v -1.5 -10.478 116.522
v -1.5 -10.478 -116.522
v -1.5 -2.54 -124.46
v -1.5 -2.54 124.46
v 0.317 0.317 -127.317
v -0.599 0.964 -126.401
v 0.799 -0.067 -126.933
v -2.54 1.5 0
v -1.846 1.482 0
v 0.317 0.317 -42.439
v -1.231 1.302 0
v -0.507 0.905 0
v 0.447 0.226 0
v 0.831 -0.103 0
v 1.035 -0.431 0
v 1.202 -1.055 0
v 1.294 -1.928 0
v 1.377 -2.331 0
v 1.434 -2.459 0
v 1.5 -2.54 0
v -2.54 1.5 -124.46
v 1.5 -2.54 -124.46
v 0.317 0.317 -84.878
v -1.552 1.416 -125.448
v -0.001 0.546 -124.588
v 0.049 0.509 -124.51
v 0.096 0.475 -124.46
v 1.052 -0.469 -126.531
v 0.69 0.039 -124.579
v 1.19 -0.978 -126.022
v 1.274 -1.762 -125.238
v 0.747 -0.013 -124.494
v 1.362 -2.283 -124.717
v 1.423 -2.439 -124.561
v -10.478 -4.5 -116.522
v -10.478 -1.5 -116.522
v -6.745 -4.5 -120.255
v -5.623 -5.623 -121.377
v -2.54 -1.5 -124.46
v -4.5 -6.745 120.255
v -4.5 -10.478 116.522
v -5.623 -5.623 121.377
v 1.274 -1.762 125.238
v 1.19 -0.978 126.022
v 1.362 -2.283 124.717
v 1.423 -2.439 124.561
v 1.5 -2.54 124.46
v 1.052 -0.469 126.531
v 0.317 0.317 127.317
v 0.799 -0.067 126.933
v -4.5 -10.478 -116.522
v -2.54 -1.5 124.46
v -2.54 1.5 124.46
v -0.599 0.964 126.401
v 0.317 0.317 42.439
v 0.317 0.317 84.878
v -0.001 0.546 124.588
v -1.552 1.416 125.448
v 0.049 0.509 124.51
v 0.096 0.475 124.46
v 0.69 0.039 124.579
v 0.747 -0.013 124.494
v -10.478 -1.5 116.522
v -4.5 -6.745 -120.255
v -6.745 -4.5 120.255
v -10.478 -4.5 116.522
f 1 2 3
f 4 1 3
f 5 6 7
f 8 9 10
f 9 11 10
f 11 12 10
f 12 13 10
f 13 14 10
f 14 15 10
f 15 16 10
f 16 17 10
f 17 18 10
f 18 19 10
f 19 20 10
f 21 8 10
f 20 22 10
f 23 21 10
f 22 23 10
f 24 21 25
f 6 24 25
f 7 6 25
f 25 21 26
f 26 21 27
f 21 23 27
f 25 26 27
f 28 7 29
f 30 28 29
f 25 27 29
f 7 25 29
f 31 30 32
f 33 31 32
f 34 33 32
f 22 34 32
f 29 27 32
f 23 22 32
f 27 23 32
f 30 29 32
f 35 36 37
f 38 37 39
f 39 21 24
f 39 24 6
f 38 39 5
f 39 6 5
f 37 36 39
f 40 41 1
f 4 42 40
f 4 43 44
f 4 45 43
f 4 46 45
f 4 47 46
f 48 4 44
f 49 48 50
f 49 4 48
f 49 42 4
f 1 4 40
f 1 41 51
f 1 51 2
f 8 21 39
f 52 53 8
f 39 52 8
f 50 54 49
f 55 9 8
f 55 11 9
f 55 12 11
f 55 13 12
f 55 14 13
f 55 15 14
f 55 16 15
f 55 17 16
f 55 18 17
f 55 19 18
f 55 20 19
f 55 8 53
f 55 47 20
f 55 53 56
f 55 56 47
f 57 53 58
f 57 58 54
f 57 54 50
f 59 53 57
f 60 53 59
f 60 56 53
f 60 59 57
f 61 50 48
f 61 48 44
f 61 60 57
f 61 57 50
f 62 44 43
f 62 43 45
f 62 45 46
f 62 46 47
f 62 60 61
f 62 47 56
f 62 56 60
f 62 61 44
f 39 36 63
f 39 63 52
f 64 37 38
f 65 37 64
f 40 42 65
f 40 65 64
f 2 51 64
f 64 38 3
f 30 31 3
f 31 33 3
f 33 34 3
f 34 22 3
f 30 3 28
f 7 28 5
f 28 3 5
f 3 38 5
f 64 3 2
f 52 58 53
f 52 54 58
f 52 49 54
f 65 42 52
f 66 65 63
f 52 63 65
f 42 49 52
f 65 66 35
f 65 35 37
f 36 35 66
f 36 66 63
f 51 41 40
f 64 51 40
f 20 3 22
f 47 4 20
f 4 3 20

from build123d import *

# Parameters (mm, degrees)
SKETCH7_W               = 7.9375
SKETCH7_H               = 3.000000096
BOSS_EXTRUDE2_DEPTH     = 130.175
SKETCH8_W               = 3.000000096
SKETCH8_H               = 7.9375
BOSS_EXTRUDE3_DEPTH     = 130.175
BOSS_EXTRUDE4_DEPTH     = 130.175
CUT_EXTRUDE4_DEPTH      = 132.01559704
CUT_EXTRUDE4_DEPTH_BACK = 132.01559704
CUT_EXTRUDE5_DEPTH      = 130.351482615
CUT_EXTRUDE5_DEPTH_BACK = 130.351482615


with BuildPart() as part:
    # Sketch7 → Boss-Extrude2 (new, symmetric)
    with BuildSketch(Plane.XY):
        with Locations((-6.50875, -3.000000096)):
            Rectangle(SKETCH7_W, SKETCH7_H)
    extrude(amount=BOSS_EXTRUDE2_DEPTH, both=True)

    # Sketch8 → Boss-Extrude3 (add, symmetric)
    with BuildSketch(Plane.XY):
        with Locations((-3.000000096, -6.50875)):
            Rectangle(SKETCH8_W, SKETCH8_H)
    extrude(amount=BOSS_EXTRUDE3_DEPTH, both=True)

    # Sketch11 → Boss-Extrude4 (add, symmetric)
    with BuildSketch(Plane.XY):
        with BuildLine():
            Line((-2.54, 1.500000048), (-2.54, -1.500000048))
            Line((-2.54, -1.500000048), (-10.4775, -1.500000048))
            Line((-10.4775, -1.500000048), (-10.4775, -4.500000144))
            Line((-10.4775, -4.500000144), (-6.745064174, -4.500000144))
            Line((-6.745064174, -4.500000144), (-4.500000144, -6.745064174))
            Line((-4.500000144, -6.745064174), (-4.500000144, -10.4775))
            Line((-4.500000144, -10.4775), (-1.500000048, -10.4775))
            Line((-1.500000048, -10.4775), (-1.500000048, -2.54))
            Line((-1.500000048, -2.54), (1.500000048, -2.54))
            add(Edge.make_bspline(
                [(-2.54, 1.500000048), (-1.295649087, 1.635512934), (-0.042467258, 0.473225958), (1.297713539, -0.292226779), (1.263724591, -2.340394541), (1.500000048, -2.54)],
                knots=[0, 0, 0, 0, 0.496686972, 0.741346965, 0.899739924, 0.899739924, 0.899739924, 0.899739924], degree=3))
        make_face()
    extrude(amount=BOSS_EXTRUDE4_DEPTH, both=True)

    # Sketch14 → Cut-Extrude4 (cut, two sides: drawn at the far end of the back side and taken through both)
    with BuildSketch(Plane(origin=(0, 0, 0), x_dir=(1, 0, 0), z_dir=(0, 1, 0)).offset(-CUT_EXTRUDE4_DEPTH_BACK)):
        Polygon((-10.4775, -116.5225), (-10.4775, -137.4775), (10.4775, -137.4775), align=None)
        Polygon((-10.4775, 116.5225), (10.4775, 137.4775), (-10.4775, 137.4775), align=None)
    extrude(amount=CUT_EXTRUDE4_DEPTH + CUT_EXTRUDE4_DEPTH_BACK, mode=Mode.SUBTRACT)

    # Sketch17 → Cut-Extrude5 (cut, two sides: drawn at the far end of the back side and taken through both)
    with BuildSketch(Plane(origin=(0, 0, 0), x_dir=(0, -1, 0), z_dir=(-1, 0, 0)).offset(-CUT_EXTRUDE5_DEPTH_BACK)):
        Polygon((10.4775, 137.4775), (10.4775, 116.5225), (-10.4775, 137.4775), align=None)
        Polygon((10.4775, -116.5225), (-10.4775, -137.4775), (10.4775, -137.4775), align=None)
    extrude(amount=CUT_EXTRUDE5_DEPTH + CUT_EXTRUDE5_DEPTH_BACK, mode=Mode.SUBTRACT)


solid = part.part
